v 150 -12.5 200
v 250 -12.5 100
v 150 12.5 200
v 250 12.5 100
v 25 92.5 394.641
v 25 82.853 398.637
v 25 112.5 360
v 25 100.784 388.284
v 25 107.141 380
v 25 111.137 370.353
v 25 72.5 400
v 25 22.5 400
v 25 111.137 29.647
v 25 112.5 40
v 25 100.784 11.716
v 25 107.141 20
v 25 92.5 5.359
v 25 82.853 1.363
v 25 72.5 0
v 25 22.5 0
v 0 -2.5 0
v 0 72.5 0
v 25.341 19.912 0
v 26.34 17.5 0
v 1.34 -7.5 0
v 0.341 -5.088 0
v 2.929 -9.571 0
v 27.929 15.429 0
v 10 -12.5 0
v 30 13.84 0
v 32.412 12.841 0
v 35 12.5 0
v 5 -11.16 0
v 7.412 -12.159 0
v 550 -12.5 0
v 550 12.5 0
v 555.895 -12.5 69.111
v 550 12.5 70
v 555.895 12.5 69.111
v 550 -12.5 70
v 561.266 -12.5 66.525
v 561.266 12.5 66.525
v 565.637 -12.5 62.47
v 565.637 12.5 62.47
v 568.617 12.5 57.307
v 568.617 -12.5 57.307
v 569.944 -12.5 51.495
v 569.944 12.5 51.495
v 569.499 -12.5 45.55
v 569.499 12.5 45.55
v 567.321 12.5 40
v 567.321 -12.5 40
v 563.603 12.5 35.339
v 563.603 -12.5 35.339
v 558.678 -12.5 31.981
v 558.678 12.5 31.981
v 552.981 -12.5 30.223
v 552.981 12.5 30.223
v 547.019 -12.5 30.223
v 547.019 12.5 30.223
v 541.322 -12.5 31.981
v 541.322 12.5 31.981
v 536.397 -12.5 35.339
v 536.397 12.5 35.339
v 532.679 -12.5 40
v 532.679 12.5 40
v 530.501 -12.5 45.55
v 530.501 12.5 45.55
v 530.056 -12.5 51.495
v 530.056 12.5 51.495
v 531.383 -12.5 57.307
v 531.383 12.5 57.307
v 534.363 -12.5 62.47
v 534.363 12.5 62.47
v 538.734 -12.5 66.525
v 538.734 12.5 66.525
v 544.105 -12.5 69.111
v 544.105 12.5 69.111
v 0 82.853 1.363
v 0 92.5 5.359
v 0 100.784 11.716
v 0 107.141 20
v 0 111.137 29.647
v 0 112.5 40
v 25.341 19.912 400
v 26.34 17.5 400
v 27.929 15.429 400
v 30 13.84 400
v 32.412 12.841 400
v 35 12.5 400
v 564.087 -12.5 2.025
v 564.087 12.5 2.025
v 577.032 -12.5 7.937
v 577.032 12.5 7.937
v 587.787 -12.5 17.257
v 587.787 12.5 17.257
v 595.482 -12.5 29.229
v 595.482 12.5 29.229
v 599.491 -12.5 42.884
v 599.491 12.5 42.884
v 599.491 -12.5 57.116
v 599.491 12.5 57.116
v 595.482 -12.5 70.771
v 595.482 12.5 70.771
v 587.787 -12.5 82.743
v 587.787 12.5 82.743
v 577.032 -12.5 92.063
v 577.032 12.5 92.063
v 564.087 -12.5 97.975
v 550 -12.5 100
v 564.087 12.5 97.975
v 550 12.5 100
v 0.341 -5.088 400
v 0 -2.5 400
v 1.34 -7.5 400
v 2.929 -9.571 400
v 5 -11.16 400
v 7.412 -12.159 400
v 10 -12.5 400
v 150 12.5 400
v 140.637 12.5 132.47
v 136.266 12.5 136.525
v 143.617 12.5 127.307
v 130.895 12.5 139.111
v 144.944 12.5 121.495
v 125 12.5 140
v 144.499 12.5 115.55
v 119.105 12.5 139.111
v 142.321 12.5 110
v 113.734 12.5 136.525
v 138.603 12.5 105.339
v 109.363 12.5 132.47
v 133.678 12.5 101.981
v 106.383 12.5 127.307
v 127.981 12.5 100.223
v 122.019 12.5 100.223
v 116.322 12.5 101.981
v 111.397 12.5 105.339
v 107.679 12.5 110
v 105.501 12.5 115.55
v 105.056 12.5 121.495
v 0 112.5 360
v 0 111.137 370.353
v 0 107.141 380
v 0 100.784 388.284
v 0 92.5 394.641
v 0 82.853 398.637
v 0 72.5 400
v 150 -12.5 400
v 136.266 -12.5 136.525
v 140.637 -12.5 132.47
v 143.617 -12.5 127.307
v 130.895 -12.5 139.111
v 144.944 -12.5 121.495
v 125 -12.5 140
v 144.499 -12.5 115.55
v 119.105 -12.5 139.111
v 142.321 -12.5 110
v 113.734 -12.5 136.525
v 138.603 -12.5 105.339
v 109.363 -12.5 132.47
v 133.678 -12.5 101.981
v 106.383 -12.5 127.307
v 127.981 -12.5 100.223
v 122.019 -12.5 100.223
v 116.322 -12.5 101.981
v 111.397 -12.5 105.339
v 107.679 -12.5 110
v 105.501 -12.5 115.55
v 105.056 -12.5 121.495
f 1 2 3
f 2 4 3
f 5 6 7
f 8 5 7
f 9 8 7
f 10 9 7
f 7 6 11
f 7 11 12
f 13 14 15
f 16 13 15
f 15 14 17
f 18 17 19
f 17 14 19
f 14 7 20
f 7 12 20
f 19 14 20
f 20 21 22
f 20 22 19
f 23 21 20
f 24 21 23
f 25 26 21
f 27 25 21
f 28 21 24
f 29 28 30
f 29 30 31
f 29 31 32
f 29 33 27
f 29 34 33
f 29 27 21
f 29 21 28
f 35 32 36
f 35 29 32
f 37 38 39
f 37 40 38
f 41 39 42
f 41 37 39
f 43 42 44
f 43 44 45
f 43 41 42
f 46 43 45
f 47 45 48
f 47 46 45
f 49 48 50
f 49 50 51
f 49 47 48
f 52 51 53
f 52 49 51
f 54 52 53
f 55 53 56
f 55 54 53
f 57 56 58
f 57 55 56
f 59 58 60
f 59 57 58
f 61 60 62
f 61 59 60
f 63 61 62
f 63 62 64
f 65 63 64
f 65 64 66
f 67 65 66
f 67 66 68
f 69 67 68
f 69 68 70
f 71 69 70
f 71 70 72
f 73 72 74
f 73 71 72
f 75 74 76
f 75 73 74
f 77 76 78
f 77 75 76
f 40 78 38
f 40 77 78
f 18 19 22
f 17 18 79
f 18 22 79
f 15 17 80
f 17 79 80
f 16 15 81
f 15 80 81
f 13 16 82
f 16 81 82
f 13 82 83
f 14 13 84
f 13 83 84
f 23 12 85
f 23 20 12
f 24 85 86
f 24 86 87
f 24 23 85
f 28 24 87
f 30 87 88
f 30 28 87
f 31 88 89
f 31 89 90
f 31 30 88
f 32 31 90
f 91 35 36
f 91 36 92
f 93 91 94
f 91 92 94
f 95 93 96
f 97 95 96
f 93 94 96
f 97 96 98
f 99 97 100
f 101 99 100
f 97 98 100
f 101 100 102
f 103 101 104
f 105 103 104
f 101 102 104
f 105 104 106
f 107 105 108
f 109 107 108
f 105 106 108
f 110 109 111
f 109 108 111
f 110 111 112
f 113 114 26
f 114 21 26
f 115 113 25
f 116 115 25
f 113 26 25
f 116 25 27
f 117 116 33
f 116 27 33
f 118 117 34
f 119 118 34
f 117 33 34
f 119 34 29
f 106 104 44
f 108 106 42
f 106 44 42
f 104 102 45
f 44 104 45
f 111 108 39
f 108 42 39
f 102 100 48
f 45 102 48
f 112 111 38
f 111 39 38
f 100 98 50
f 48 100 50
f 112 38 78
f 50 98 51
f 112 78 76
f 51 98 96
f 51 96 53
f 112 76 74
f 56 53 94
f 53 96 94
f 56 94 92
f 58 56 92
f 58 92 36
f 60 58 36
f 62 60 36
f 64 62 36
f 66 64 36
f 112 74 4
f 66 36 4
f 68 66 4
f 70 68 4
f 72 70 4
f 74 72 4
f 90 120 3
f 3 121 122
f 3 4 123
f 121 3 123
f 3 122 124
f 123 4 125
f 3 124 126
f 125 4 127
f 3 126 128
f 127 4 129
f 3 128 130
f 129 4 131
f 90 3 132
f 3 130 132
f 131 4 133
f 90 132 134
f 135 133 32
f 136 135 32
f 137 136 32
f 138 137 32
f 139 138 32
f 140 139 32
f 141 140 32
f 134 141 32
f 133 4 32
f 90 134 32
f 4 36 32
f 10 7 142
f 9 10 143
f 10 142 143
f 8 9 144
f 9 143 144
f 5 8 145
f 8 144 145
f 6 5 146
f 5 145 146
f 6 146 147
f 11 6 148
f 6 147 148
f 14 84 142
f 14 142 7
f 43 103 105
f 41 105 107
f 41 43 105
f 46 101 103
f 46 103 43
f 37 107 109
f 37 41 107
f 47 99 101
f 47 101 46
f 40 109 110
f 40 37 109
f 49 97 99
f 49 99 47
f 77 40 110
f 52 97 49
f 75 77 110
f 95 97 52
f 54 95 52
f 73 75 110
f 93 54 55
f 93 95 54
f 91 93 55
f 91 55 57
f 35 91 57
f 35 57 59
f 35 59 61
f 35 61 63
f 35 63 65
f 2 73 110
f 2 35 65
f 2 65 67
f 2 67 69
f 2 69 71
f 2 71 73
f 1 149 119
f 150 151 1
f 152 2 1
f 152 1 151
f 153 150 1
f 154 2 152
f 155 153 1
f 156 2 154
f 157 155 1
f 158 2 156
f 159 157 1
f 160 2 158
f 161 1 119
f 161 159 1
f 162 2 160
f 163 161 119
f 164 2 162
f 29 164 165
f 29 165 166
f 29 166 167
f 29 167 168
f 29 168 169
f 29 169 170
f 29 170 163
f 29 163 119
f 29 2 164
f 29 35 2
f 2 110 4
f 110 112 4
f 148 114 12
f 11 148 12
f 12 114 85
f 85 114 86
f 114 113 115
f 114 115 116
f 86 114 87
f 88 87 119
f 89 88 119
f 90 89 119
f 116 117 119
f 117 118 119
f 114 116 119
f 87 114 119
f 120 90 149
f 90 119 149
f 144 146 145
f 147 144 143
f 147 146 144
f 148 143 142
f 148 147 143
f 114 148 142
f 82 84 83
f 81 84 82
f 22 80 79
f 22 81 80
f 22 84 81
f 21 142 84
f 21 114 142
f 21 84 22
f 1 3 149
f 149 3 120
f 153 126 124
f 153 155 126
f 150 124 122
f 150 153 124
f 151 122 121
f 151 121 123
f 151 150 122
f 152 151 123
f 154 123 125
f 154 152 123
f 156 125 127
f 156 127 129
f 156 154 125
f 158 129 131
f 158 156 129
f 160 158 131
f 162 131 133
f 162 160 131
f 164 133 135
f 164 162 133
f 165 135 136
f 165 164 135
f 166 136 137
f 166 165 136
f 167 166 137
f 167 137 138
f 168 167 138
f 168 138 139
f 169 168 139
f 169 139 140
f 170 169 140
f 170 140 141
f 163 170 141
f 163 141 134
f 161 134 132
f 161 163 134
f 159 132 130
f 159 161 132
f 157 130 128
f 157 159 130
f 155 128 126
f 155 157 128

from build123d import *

# Parameters (mm, degrees)
SKETCH1_R           = 20
BOSS_EXTRUDE1_DEPTH = 12.5
SKETCH2_W           = 25
SKETCH2_H           = 400
BOSS_EXTRUDE2_DEPTH = 100
CUT_EXTRUDE2_DEPTH  = 730.83302885
FILLET1_R           = 10


with BuildPart() as part:
    # Sketch1 → Boss-Extrude1 (new, symmetric)
    with BuildSketch(Plane(origin=(0, 0, 0), x_dir=(1, 0, 0), z_dir=(0, 1, 0))):
        with BuildLine():
            Line((0, 0), (550, 0))
            ThreePointArc((550, 0), (600, -50), (550, -100))
            Line((550, -100), (250, -100))
            Line((250, -100), (150, -200))
            Line((150, -200), (150, -400))
            Line((150, -400), (0, -400))
            Line((0, -400), (0, 0))
        make_face()
        with Locations(Location((550, -50, 0), (0, 0, 270))):
            Circle(SKETCH1_R, mode=Mode.SUBTRACT)
        with Locations(Location((125, -120, 0), (0, 0, 270))):
            Circle(SKETCH1_R, mode=Mode.SUBTRACT)
    extrude(amount=BOSS_EXTRUDE1_DEPTH, both=True)

    # Sketch2 → Boss-Extrude2 (add)
    with BuildSketch(Plane(origin=(0, 12.5, 0), x_dir=(1, 0, 0), z_dir=(0, 1, 0))):
        with Locations((12.5, -200)):
            Rectangle(SKETCH2_W, SKETCH2_H)
    extrude(amount=BOSS_EXTRUDE2_DEPTH)

    # Sketch3 → Cut-Extrude2 (cut, through all)
    with BuildSketch(Plane.ZY):
        with BuildLine():
            Line((0, 112.5), (0, 72.5))
            ThreePointArc((0, 72.5), (11.715728753, 100.784271247), (40, 112.5))
            Line((40, 112.5), (0, 112.5))
        make_face()
        with BuildLine():
            Line((400, 112.5), (360, 112.5))
            ThreePointArc((360, 112.5), (388.284271247, 100.784271247), (400, 72.5))
            Line((400, 72.5), (400, 112.5))
        make_face()
    extrude(amount=-CUT_EXTRUDE2_DEPTH, mode=Mode.SUBTRACT)

    # Fillet1
    fillet1_edges = [part.edges().sort_by_distance(p)[0] for p in [
        (0, -12.5, 200),
        (25, 12.5, 200),
    ]]
    fillet(fillet1_edges, radius=FILLET1_R)


solid = part.part
